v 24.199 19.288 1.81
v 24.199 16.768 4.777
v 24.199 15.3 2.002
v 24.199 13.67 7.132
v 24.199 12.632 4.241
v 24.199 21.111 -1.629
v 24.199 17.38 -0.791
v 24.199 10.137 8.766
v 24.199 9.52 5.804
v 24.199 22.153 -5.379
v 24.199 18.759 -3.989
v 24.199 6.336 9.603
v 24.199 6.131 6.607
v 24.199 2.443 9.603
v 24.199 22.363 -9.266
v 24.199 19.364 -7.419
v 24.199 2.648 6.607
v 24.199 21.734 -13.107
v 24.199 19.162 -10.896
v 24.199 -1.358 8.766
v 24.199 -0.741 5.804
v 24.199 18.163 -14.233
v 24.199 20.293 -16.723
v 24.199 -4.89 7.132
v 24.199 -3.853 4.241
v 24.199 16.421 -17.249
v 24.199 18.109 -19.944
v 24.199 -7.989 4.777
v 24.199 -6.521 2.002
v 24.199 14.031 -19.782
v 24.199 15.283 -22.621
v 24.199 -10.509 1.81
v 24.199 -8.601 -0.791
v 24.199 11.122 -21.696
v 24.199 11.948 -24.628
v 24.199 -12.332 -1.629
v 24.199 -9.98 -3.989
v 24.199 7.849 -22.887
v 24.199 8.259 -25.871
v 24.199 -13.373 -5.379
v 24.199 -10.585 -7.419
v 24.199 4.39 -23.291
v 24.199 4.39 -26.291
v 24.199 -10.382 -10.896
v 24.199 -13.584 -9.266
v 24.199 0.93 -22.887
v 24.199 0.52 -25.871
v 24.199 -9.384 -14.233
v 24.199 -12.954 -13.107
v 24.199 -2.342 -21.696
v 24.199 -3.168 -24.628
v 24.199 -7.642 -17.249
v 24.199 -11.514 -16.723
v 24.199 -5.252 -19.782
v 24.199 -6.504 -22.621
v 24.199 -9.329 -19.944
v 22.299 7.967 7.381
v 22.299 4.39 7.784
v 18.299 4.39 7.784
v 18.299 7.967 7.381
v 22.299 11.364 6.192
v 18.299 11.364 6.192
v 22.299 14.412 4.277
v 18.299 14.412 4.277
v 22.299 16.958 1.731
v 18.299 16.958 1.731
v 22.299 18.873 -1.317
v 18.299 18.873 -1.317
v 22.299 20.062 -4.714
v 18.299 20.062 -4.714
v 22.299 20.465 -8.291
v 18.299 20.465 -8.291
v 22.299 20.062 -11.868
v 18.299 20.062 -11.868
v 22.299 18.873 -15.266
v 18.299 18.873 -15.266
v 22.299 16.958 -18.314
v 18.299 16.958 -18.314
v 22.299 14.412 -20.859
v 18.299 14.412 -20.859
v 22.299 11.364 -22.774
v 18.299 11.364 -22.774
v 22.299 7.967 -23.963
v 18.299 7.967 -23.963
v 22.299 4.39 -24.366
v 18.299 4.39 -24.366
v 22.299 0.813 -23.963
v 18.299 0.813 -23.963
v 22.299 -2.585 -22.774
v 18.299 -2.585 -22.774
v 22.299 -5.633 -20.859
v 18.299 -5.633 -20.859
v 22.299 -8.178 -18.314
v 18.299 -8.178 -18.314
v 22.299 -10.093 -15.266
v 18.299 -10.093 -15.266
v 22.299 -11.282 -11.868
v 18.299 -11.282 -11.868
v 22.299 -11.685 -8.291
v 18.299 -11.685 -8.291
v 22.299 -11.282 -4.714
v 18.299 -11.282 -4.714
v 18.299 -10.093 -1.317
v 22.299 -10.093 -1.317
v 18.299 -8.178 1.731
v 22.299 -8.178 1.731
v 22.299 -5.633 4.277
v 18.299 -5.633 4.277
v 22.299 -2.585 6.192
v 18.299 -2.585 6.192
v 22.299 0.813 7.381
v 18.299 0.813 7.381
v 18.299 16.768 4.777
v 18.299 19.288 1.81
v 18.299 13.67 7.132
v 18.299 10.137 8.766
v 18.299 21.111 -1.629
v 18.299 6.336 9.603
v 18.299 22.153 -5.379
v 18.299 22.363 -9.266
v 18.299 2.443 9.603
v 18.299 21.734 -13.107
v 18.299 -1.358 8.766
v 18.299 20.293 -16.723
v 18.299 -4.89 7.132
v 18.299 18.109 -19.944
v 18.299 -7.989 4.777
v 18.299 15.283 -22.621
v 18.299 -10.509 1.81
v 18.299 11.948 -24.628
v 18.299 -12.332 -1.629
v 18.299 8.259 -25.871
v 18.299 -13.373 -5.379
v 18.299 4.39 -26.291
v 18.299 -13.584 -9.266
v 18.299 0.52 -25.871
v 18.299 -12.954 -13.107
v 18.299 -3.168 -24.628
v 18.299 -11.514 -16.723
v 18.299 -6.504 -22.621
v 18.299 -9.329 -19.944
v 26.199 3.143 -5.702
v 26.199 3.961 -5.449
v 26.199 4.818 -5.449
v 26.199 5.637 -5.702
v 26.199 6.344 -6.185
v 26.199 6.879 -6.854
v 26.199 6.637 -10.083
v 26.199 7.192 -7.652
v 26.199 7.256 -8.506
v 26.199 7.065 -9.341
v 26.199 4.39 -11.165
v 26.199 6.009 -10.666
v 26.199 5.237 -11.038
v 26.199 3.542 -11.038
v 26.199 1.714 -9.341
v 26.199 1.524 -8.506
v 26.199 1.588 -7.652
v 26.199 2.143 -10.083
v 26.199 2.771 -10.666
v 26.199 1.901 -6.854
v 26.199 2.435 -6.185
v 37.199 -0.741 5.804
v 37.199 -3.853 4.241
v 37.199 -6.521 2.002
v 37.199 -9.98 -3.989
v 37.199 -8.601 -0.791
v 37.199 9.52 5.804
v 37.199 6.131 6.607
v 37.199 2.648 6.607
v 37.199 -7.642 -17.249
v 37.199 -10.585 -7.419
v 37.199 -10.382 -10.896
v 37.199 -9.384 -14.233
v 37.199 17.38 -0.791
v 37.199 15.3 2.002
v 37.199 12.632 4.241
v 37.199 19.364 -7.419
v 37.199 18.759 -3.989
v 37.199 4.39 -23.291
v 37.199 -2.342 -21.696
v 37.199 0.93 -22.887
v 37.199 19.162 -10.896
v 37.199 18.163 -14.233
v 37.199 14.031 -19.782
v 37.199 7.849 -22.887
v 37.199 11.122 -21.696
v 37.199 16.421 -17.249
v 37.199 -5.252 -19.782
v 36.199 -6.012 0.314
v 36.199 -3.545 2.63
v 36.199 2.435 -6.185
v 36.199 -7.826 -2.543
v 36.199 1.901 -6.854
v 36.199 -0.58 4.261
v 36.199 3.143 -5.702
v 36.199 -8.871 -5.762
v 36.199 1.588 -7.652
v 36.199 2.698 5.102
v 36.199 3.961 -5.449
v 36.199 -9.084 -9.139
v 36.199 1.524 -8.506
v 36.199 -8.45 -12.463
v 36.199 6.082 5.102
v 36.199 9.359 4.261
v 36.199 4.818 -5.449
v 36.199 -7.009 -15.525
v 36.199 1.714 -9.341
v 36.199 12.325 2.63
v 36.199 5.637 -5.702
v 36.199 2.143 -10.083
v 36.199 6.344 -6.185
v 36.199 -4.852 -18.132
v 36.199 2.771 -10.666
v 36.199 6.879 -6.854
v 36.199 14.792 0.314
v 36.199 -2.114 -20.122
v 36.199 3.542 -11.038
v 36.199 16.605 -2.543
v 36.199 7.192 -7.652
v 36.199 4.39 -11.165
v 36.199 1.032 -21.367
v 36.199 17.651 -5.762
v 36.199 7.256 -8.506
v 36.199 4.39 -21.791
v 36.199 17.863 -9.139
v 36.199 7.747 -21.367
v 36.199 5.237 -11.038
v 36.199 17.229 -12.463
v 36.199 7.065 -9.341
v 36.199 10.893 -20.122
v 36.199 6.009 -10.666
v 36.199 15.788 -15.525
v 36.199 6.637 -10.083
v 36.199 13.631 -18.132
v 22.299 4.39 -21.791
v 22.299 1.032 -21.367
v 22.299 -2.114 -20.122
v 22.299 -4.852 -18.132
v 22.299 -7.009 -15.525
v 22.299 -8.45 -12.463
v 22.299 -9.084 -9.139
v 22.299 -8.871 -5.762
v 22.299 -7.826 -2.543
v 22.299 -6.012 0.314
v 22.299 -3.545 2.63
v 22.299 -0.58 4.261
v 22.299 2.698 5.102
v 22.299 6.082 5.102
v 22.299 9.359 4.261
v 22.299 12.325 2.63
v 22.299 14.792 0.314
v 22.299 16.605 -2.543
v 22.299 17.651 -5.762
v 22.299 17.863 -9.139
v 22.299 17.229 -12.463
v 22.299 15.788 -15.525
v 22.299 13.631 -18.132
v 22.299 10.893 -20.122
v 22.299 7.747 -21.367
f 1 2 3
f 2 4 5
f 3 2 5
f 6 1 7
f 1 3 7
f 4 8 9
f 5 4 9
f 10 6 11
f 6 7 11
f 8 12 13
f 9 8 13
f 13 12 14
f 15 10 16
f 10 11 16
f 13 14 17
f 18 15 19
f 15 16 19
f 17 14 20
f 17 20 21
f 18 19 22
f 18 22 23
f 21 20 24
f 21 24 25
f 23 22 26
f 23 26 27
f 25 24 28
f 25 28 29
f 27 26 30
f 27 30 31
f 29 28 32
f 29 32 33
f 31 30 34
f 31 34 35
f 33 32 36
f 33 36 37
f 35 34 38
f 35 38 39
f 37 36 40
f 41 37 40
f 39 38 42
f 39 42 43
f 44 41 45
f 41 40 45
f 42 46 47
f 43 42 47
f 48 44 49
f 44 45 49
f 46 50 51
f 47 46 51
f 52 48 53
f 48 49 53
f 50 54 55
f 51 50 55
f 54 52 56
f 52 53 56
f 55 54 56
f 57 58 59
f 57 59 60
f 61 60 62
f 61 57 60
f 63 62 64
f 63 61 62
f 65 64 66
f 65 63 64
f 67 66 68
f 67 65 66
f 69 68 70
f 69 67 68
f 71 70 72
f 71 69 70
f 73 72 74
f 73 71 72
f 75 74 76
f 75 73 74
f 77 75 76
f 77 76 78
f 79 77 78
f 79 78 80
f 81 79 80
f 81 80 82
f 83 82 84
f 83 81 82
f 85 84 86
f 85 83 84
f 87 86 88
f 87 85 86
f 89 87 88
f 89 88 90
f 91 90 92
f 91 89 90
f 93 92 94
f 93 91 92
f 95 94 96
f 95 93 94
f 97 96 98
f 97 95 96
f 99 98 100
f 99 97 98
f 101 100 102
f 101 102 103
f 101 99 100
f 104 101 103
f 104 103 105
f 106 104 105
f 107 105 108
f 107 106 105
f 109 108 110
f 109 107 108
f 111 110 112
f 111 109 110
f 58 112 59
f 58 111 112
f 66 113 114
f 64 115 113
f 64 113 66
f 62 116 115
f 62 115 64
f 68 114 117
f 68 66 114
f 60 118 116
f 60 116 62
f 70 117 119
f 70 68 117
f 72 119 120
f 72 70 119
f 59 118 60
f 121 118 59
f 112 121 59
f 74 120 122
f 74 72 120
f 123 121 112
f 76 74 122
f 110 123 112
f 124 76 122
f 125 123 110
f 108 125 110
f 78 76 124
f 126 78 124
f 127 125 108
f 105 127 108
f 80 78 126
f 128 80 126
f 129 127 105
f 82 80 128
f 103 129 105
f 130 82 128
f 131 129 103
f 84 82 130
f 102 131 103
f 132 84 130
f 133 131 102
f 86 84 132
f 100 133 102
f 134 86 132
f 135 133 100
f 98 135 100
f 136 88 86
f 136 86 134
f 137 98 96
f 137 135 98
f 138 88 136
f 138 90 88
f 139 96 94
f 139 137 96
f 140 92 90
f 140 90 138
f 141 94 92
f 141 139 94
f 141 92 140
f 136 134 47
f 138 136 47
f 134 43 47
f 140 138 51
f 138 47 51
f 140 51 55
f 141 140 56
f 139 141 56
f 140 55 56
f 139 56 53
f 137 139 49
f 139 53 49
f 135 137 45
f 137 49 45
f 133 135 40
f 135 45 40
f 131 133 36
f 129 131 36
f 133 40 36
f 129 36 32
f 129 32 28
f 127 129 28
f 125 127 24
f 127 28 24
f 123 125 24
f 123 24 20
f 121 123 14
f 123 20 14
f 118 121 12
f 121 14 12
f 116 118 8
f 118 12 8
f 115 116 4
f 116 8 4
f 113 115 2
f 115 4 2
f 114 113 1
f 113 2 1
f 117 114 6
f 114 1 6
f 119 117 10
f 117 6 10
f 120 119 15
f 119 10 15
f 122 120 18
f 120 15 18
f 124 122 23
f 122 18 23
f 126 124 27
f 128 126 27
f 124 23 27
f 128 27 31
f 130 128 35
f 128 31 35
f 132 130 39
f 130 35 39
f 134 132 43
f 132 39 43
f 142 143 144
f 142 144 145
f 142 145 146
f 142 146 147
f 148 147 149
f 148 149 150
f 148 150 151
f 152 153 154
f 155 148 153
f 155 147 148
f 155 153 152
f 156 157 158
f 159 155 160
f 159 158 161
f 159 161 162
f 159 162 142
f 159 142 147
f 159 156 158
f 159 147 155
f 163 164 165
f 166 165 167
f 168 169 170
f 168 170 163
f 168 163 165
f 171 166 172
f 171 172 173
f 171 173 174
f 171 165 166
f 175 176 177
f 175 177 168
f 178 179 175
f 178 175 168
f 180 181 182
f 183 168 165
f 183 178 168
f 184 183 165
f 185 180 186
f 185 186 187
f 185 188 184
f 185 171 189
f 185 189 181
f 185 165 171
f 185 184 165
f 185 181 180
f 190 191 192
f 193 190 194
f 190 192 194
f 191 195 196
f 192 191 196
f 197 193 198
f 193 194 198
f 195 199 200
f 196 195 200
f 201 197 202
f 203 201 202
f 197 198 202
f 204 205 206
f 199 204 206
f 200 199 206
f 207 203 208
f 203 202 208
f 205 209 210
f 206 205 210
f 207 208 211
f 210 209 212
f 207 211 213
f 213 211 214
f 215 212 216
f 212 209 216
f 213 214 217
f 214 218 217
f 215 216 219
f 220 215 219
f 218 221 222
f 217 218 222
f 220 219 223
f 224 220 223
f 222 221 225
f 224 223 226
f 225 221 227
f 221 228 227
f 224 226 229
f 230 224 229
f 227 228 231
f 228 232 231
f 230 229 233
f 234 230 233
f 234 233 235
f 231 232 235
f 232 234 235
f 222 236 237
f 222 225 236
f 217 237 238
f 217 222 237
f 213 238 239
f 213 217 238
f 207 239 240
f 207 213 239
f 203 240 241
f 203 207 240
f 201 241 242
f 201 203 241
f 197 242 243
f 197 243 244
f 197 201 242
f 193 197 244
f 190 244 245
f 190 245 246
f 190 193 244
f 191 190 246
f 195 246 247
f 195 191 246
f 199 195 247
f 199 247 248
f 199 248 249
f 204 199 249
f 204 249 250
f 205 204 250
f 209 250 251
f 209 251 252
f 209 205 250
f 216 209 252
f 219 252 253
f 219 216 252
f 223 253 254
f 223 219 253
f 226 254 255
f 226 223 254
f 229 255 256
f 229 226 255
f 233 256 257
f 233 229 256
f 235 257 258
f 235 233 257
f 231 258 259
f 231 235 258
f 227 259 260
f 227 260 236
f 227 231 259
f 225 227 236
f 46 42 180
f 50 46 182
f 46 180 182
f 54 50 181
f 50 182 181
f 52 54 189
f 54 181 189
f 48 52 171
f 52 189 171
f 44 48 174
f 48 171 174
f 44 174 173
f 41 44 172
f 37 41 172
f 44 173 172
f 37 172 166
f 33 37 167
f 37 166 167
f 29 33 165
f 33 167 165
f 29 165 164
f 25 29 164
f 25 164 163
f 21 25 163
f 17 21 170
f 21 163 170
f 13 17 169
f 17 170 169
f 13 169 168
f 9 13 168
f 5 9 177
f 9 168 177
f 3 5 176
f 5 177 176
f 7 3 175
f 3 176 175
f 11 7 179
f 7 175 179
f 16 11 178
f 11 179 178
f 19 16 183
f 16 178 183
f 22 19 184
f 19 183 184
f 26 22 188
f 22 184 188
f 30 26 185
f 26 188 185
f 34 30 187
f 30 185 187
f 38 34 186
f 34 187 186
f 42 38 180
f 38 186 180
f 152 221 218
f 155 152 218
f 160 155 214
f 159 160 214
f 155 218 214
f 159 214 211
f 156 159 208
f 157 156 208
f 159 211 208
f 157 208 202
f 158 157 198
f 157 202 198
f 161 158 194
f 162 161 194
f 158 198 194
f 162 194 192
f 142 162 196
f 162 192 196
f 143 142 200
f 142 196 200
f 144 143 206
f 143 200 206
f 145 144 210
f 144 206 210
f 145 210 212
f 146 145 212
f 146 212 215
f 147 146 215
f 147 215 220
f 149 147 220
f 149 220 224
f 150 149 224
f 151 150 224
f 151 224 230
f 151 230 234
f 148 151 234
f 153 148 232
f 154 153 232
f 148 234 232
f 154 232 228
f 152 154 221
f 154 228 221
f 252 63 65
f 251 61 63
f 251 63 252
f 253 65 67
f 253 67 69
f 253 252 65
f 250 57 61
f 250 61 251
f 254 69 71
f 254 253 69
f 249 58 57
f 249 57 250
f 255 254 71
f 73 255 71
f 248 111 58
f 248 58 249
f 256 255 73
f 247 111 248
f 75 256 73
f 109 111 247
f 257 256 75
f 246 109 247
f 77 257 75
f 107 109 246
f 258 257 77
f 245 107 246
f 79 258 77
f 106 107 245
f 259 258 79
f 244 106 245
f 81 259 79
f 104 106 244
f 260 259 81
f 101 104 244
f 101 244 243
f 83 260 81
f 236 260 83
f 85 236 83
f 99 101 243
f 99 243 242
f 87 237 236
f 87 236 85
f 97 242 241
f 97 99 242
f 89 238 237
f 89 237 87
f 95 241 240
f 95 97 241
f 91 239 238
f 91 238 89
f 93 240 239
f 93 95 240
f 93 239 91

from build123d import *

# Parameters (mm, degrees)
SPUR_START             = 15.199213342
SPUR_GEAR_AM_OUTLINE_R = 1.5
SPUR_GEAR_AM_DEPTH     = 12
SKETCH9_R              = 1.5
BOSS_EXTRUDE1_DEPTH    = 12
SKETCH10_R             = 2.874
BOSS_EXTRUDE2_DEPTH    = 10
SKETCH11_R             = 15
BOSS_EXTRUDE3_DEPTH    = 1
SKETCH12_R             = 15
SKETCH12_R_2           = 13.5
BOSS_EXTRUDE4_DEPTH    = 13
SKETCH13_R             = 18
SKETCH13_R_2           = 13.5
BOSS_EXTRUDE5_DEPTH    = 1.9
SKETCH14_R             = 18
SKETCH14_R_2           = 16.075
BOSS_EXTRUDE6_DEPTH    = 4
SKETCH17_R             = 4
CUT_EXTRUDE2_DEPTH     = 41.416963439
SKETCH19_R             = 2.874
BOSS_EXTRUDE7_DEPTH    = 10


# Read off the part's stored shape, not the designer's step: spur gear_am
with BuildPart() as part:
    # spur gear_am outline → spur gear_am (new body)
    with BuildSketch(Plane.YZ.offset(SPUR_START)):
        with BuildLine():
            ThreePointArc((2.747947228, -4.643773619), (2.654088149, -4.687486435), (2.561391914, -4.733613923))
            ThreePointArc((2.561391914, -4.733613923), (2.561783739, -5.337982285), (2.816889806, -5.88587111))
            ThreePointArc((2.816889806, -5.88587111), (2.597713415, -6.044378226), (2.394409068, -6.222788256))
            ThreePointArc((2.394409068, -6.222788256), (1.9170234, -5.852161498), (1.327895004, -5.717294884))
            ThreePointArc((1.327895004, -5.717294884), (1.262297175, -5.797402699), (1.198794721, -5.879181519))
            ThreePointArc((1.198794721, -5.879181519), (1.461373347, -6.423528591), (1.928936024, -6.806472991))
            ThreePointArc((1.928936024, -6.806472991), (1.800238579, -7.04438004), (1.694476903, -7.293332374))
            ThreePointArc((1.694476903, -7.293332374), (1.103558354, -7.166539081), (0.514255579, -7.300641692))
            ThreePointArc((0.514255579, -7.300641692), (0.489911456, -7.401278171), (0.468180222, -7.502511024))
            ThreePointArc((0.468180222, -7.502511024), (0.940938733, -7.879022193), (1.528351497, -8.021175333))
            ThreePointArc((1.528351497, -8.021175333), (1.515623105, -8.291361907), (1.528351497, -8.56154848))
            ThreePointArc((1.528351497, -8.56154848), (0.940938733, -8.70370162), (0.468180222, -9.080212789))
            ThreePointArc((0.468180222, -9.080212789), (0.489911456, -9.181445642), (0.514255579, -9.28208212))
            ThreePointArc((0.514255579, -9.28208212), (1.103558354, -9.416184732), (1.694476903, -9.289391439))
            ThreePointArc((1.694476903, -9.289391439), (1.800238579, -9.538343772), (1.928936024, -9.776250821))
            ThreePointArc((1.928936024, -9.776250821), (1.461373347, -10.159195221), (1.198794721, -10.703542294))
            ThreePointArc((1.198794721, -10.703542294), (1.262297175, -10.785321114), (1.327895004, -10.865428928))
            ThreePointArc((1.327895004, -10.865428928), (1.9170234, -10.730562315), (2.394409068, -10.359935556))
            ThreePointArc((2.394409068, -10.359935556), (2.597713414, -10.538345587), (2.816889806, -10.696852703))
            ThreePointArc((2.816889806, -10.696852703), (2.561783739, -11.244741528), (2.561391914, -11.84910989))
            ThreePointArc((2.561391914, -11.84910989), (2.654088149, -11.895237378), (2.747947228, -11.938950194))
            ThreePointArc((2.747947228, -11.938950194), (3.220217142, -11.561826343), (3.489517843, -11.020773293))
            ThreePointArc((3.489517843, -11.020773293), (3.750097941, -11.093304726), (4.016342706, -11.14101763))
            ThreePointArc((4.016342706, -11.14101763), (4.024220134, -11.745334779), (4.286092716, -12.290021864))
            ThreePointArc((4.286092716, -12.290021864), (4.389623105, -12.291361906), (4.493153494, -12.290021864))
            ThreePointArc((4.493153494, -12.290021864), (4.755026076, -11.745334779), (4.762903504, -11.14101763))
            ThreePointArc((4.762903504, -11.14101763), (5.029148269, -11.093304726), (5.289728367, -11.020773293))
            ThreePointArc((5.289728367, -11.020773293), (5.559029068, -11.561826343), (6.031298982, -11.938950194))
            ThreePointArc((6.031298982, -11.938950194), (6.125158061, -11.895237378), (6.217854296, -11.84910989))
            ThreePointArc((6.217854296, -11.84910989), (6.217462471, -11.244741528), (5.962356404, -10.696852703))
            ThreePointArc((5.962356404, -10.696852703), (6.181532796, -10.538345587), (6.384837142, -10.359935556))
            ThreePointArc((6.384837142, -10.359935556), (6.86222281, -10.730562315), (7.451351206, -10.865428928))
            ThreePointArc((7.451351206, -10.865428928), (7.516949035, -10.785321114), (7.580451489, -10.703542294))
            ThreePointArc((7.580451489, -10.703542294), (7.317872863, -10.159195221), (6.850310186, -9.776250821))
            ThreePointArc((6.850310186, -9.776250821), (6.979007631, -9.538343772), (7.084769307, -9.289391439))
            ThreePointArc((7.084769307, -9.289391439), (7.675687856, -9.416184732), (8.26499063, -9.28208212))
            ThreePointArc((8.26499063, -9.28208212), (8.289334754, -9.181445642), (8.311065988, -9.080212789))
            ThreePointArc((8.311065988, -9.080212789), (7.838307477, -8.70370162), (7.250894713, -8.56154848))
            ThreePointArc((7.250894713, -8.56154848), (7.263623105, -8.291361907), (7.250894713, -8.021175333))
            ThreePointArc((7.250894713, -8.021175333), (7.838307477, -7.879022193), (8.311065988, -7.502511024))
            ThreePointArc((8.311065988, -7.502511024), (8.289334754, -7.40127817), (8.26499063, -7.300641692))
            ThreePointArc((8.26499063, -7.300641692), (7.675687856, -7.166539081), (7.084769307, -7.293332374))
            ThreePointArc((7.084769307, -7.293332374), (6.979007631, -7.04438004), (6.850310186, -6.806472991))
            ThreePointArc((6.850310186, -6.806472991), (7.317872863, -6.423528591), (7.580451489, -5.879181519))
            ThreePointArc((7.580451489, -5.879181519), (7.516949035, -5.797402699), (7.451351206, -5.717294884))
            ThreePointArc((7.451351206, -5.717294884), (6.86222281, -5.852161498), (6.384837142, -6.222788256))
            ThreePointArc((6.384837142, -6.222788256), (6.181532795, -6.044378226), (5.962356404, -5.88587111))
            ThreePointArc((5.962356404, -5.88587111), (6.217462471, -5.337982285), (6.217854296, -4.733613923))
            ThreePointArc((6.217854296, -4.733613923), (6.125158061, -4.687486435), (6.031298982, -4.643773619))
            ThreePointArc((6.031298982, -4.643773619), (5.559029068, -5.02089747), (5.289728367, -5.56195052))
            ThreePointArc((5.289728367, -5.56195052), (5.029148269, -5.489419087), (4.762903504, -5.441706183))
            ThreePointArc((4.762903504, -5.441706183), (4.755026076, -4.837389034), (4.493153494, -4.292701948))
            ThreePointArc((4.493153494, -4.292701948), (4.389623105, -4.291361906), (4.286092716, -4.292701948))
            ThreePointArc((4.286092716, -4.292701948), (4.024220134, -4.837389034), (4.016342706, -5.441706183))
            ThreePointArc((4.016342706, -5.441706183), (3.750097941, -5.489419087), (3.489517843, -5.56195052))
            ThreePointArc((3.489517843, -5.56195052), (3.220217142, -5.02089747), (2.747947228, -4.643773619))
        make_face()
        with Locations((4.389623105, -8.291361906)):
            Circle(SPUR_GEAR_AM_OUTLINE_R, mode=Mode.SUBTRACT)
    extrude(amount=SPUR_GEAR_AM_DEPTH)

    # Sketch9 → Boss-Extrude1 (add, through all)
    with BuildSketch(Plane(origin=(27.199213342, 0, 0), x_dir=(0, 0, -1), z_dir=(1, 0, 0))):
        with Locations((8.291361906, 4.389623105)):
            Circle(SKETCH9_R)
    extrude(amount=-BOSS_EXTRUDE1_DEPTH)

    # Sketch10 → Boss-Extrude2 (add)
    with BuildSketch(Plane(origin=(27.199213342, 0, 0), x_dir=(0, 0, -1), z_dir=(1, 0, 0))):
        with Locations(Location((8.291361906, 4.389623105, 0), (0, 0, 172.537235833))):
            Circle(SKETCH10_R)
    extrude(amount=BOSS_EXTRUDE2_DEPTH)

    # Sketch11 → Boss-Extrude3 (add)
    with BuildSketch(Plane(origin=(37.199213342, 0, 0), x_dir=(0, 0, -1), z_dir=(1, 0, 0))):
        with Locations((8.291361906, 4.389623105)):
            Circle(SKETCH11_R)
    extrude(amount=-BOSS_EXTRUDE3_DEPTH)

    # Sketch12 → Boss-Extrude4 (add)
    with BuildSketch(Plane.ZY.offset(-37.199213342)):
        with Locations(Location((-8.291361906, 4.389623105, 0), (0, 0, 180))):
            Circle(SKETCH12_R)
        with Locations(Location((-8.291361906, 4.389623105, 0), (0, 0, 180))):
            Circle(SKETCH12_R_2, mode=Mode.SUBTRACT)
    extrude(amount=BOSS_EXTRUDE4_DEPTH)

    # Sketch13 → Boss-Extrude5 (add)
    with BuildSketch(Plane.ZY.offset(-24.199213342)):
        with Locations(Location((-8.291361906, 4.389623105, 0), (0, 0, 180))):
            Circle(SKETCH13_R)
        with Locations(Location((-8.291361906, 4.389623105, 0), (0, 0, 180))):
            Circle(SKETCH13_R_2, mode=Mode.SUBTRACT)
    extrude(amount=BOSS_EXTRUDE5_DEPTH)

    # Sketch14 → Boss-Extrude6 (add)
    with BuildSketch(Plane.ZY.offset(-22.299213342)):
        with Locations(Location((-8.291361906, 4.389623105, 0), (0, 0, 180))):
            Circle(SKETCH14_R)
        with Locations((-8.291361906, 4.389623105)):
            Circle(SKETCH14_R_2, mode=Mode.SUBTRACT)
    extrude(amount=BOSS_EXTRUDE6_DEPTH)

    # Sketch17 → Cut-Extrude2 (cut, through all)
    with BuildSketch(Plane.ZY.offset(-36.199213342)):
        with Locations((-8.291361906, 4.389623105)):
            Circle(SKETCH17_R)
    extrude(amount=CUT_EXTRUDE2_DEPTH, mode=Mode.SUBTRACT)

    # Sketch19 → Boss-Extrude7 (add)
    with BuildSketch(Plane.ZY.offset(-36.199213342)):
        with Locations(Location((-8.291361906, 4.389623105, 0), (0, 0, 180))):
            Circle(SKETCH19_R)
    extrude(amount=BOSS_EXTRUDE7_DEPTH)


solid = part.part
